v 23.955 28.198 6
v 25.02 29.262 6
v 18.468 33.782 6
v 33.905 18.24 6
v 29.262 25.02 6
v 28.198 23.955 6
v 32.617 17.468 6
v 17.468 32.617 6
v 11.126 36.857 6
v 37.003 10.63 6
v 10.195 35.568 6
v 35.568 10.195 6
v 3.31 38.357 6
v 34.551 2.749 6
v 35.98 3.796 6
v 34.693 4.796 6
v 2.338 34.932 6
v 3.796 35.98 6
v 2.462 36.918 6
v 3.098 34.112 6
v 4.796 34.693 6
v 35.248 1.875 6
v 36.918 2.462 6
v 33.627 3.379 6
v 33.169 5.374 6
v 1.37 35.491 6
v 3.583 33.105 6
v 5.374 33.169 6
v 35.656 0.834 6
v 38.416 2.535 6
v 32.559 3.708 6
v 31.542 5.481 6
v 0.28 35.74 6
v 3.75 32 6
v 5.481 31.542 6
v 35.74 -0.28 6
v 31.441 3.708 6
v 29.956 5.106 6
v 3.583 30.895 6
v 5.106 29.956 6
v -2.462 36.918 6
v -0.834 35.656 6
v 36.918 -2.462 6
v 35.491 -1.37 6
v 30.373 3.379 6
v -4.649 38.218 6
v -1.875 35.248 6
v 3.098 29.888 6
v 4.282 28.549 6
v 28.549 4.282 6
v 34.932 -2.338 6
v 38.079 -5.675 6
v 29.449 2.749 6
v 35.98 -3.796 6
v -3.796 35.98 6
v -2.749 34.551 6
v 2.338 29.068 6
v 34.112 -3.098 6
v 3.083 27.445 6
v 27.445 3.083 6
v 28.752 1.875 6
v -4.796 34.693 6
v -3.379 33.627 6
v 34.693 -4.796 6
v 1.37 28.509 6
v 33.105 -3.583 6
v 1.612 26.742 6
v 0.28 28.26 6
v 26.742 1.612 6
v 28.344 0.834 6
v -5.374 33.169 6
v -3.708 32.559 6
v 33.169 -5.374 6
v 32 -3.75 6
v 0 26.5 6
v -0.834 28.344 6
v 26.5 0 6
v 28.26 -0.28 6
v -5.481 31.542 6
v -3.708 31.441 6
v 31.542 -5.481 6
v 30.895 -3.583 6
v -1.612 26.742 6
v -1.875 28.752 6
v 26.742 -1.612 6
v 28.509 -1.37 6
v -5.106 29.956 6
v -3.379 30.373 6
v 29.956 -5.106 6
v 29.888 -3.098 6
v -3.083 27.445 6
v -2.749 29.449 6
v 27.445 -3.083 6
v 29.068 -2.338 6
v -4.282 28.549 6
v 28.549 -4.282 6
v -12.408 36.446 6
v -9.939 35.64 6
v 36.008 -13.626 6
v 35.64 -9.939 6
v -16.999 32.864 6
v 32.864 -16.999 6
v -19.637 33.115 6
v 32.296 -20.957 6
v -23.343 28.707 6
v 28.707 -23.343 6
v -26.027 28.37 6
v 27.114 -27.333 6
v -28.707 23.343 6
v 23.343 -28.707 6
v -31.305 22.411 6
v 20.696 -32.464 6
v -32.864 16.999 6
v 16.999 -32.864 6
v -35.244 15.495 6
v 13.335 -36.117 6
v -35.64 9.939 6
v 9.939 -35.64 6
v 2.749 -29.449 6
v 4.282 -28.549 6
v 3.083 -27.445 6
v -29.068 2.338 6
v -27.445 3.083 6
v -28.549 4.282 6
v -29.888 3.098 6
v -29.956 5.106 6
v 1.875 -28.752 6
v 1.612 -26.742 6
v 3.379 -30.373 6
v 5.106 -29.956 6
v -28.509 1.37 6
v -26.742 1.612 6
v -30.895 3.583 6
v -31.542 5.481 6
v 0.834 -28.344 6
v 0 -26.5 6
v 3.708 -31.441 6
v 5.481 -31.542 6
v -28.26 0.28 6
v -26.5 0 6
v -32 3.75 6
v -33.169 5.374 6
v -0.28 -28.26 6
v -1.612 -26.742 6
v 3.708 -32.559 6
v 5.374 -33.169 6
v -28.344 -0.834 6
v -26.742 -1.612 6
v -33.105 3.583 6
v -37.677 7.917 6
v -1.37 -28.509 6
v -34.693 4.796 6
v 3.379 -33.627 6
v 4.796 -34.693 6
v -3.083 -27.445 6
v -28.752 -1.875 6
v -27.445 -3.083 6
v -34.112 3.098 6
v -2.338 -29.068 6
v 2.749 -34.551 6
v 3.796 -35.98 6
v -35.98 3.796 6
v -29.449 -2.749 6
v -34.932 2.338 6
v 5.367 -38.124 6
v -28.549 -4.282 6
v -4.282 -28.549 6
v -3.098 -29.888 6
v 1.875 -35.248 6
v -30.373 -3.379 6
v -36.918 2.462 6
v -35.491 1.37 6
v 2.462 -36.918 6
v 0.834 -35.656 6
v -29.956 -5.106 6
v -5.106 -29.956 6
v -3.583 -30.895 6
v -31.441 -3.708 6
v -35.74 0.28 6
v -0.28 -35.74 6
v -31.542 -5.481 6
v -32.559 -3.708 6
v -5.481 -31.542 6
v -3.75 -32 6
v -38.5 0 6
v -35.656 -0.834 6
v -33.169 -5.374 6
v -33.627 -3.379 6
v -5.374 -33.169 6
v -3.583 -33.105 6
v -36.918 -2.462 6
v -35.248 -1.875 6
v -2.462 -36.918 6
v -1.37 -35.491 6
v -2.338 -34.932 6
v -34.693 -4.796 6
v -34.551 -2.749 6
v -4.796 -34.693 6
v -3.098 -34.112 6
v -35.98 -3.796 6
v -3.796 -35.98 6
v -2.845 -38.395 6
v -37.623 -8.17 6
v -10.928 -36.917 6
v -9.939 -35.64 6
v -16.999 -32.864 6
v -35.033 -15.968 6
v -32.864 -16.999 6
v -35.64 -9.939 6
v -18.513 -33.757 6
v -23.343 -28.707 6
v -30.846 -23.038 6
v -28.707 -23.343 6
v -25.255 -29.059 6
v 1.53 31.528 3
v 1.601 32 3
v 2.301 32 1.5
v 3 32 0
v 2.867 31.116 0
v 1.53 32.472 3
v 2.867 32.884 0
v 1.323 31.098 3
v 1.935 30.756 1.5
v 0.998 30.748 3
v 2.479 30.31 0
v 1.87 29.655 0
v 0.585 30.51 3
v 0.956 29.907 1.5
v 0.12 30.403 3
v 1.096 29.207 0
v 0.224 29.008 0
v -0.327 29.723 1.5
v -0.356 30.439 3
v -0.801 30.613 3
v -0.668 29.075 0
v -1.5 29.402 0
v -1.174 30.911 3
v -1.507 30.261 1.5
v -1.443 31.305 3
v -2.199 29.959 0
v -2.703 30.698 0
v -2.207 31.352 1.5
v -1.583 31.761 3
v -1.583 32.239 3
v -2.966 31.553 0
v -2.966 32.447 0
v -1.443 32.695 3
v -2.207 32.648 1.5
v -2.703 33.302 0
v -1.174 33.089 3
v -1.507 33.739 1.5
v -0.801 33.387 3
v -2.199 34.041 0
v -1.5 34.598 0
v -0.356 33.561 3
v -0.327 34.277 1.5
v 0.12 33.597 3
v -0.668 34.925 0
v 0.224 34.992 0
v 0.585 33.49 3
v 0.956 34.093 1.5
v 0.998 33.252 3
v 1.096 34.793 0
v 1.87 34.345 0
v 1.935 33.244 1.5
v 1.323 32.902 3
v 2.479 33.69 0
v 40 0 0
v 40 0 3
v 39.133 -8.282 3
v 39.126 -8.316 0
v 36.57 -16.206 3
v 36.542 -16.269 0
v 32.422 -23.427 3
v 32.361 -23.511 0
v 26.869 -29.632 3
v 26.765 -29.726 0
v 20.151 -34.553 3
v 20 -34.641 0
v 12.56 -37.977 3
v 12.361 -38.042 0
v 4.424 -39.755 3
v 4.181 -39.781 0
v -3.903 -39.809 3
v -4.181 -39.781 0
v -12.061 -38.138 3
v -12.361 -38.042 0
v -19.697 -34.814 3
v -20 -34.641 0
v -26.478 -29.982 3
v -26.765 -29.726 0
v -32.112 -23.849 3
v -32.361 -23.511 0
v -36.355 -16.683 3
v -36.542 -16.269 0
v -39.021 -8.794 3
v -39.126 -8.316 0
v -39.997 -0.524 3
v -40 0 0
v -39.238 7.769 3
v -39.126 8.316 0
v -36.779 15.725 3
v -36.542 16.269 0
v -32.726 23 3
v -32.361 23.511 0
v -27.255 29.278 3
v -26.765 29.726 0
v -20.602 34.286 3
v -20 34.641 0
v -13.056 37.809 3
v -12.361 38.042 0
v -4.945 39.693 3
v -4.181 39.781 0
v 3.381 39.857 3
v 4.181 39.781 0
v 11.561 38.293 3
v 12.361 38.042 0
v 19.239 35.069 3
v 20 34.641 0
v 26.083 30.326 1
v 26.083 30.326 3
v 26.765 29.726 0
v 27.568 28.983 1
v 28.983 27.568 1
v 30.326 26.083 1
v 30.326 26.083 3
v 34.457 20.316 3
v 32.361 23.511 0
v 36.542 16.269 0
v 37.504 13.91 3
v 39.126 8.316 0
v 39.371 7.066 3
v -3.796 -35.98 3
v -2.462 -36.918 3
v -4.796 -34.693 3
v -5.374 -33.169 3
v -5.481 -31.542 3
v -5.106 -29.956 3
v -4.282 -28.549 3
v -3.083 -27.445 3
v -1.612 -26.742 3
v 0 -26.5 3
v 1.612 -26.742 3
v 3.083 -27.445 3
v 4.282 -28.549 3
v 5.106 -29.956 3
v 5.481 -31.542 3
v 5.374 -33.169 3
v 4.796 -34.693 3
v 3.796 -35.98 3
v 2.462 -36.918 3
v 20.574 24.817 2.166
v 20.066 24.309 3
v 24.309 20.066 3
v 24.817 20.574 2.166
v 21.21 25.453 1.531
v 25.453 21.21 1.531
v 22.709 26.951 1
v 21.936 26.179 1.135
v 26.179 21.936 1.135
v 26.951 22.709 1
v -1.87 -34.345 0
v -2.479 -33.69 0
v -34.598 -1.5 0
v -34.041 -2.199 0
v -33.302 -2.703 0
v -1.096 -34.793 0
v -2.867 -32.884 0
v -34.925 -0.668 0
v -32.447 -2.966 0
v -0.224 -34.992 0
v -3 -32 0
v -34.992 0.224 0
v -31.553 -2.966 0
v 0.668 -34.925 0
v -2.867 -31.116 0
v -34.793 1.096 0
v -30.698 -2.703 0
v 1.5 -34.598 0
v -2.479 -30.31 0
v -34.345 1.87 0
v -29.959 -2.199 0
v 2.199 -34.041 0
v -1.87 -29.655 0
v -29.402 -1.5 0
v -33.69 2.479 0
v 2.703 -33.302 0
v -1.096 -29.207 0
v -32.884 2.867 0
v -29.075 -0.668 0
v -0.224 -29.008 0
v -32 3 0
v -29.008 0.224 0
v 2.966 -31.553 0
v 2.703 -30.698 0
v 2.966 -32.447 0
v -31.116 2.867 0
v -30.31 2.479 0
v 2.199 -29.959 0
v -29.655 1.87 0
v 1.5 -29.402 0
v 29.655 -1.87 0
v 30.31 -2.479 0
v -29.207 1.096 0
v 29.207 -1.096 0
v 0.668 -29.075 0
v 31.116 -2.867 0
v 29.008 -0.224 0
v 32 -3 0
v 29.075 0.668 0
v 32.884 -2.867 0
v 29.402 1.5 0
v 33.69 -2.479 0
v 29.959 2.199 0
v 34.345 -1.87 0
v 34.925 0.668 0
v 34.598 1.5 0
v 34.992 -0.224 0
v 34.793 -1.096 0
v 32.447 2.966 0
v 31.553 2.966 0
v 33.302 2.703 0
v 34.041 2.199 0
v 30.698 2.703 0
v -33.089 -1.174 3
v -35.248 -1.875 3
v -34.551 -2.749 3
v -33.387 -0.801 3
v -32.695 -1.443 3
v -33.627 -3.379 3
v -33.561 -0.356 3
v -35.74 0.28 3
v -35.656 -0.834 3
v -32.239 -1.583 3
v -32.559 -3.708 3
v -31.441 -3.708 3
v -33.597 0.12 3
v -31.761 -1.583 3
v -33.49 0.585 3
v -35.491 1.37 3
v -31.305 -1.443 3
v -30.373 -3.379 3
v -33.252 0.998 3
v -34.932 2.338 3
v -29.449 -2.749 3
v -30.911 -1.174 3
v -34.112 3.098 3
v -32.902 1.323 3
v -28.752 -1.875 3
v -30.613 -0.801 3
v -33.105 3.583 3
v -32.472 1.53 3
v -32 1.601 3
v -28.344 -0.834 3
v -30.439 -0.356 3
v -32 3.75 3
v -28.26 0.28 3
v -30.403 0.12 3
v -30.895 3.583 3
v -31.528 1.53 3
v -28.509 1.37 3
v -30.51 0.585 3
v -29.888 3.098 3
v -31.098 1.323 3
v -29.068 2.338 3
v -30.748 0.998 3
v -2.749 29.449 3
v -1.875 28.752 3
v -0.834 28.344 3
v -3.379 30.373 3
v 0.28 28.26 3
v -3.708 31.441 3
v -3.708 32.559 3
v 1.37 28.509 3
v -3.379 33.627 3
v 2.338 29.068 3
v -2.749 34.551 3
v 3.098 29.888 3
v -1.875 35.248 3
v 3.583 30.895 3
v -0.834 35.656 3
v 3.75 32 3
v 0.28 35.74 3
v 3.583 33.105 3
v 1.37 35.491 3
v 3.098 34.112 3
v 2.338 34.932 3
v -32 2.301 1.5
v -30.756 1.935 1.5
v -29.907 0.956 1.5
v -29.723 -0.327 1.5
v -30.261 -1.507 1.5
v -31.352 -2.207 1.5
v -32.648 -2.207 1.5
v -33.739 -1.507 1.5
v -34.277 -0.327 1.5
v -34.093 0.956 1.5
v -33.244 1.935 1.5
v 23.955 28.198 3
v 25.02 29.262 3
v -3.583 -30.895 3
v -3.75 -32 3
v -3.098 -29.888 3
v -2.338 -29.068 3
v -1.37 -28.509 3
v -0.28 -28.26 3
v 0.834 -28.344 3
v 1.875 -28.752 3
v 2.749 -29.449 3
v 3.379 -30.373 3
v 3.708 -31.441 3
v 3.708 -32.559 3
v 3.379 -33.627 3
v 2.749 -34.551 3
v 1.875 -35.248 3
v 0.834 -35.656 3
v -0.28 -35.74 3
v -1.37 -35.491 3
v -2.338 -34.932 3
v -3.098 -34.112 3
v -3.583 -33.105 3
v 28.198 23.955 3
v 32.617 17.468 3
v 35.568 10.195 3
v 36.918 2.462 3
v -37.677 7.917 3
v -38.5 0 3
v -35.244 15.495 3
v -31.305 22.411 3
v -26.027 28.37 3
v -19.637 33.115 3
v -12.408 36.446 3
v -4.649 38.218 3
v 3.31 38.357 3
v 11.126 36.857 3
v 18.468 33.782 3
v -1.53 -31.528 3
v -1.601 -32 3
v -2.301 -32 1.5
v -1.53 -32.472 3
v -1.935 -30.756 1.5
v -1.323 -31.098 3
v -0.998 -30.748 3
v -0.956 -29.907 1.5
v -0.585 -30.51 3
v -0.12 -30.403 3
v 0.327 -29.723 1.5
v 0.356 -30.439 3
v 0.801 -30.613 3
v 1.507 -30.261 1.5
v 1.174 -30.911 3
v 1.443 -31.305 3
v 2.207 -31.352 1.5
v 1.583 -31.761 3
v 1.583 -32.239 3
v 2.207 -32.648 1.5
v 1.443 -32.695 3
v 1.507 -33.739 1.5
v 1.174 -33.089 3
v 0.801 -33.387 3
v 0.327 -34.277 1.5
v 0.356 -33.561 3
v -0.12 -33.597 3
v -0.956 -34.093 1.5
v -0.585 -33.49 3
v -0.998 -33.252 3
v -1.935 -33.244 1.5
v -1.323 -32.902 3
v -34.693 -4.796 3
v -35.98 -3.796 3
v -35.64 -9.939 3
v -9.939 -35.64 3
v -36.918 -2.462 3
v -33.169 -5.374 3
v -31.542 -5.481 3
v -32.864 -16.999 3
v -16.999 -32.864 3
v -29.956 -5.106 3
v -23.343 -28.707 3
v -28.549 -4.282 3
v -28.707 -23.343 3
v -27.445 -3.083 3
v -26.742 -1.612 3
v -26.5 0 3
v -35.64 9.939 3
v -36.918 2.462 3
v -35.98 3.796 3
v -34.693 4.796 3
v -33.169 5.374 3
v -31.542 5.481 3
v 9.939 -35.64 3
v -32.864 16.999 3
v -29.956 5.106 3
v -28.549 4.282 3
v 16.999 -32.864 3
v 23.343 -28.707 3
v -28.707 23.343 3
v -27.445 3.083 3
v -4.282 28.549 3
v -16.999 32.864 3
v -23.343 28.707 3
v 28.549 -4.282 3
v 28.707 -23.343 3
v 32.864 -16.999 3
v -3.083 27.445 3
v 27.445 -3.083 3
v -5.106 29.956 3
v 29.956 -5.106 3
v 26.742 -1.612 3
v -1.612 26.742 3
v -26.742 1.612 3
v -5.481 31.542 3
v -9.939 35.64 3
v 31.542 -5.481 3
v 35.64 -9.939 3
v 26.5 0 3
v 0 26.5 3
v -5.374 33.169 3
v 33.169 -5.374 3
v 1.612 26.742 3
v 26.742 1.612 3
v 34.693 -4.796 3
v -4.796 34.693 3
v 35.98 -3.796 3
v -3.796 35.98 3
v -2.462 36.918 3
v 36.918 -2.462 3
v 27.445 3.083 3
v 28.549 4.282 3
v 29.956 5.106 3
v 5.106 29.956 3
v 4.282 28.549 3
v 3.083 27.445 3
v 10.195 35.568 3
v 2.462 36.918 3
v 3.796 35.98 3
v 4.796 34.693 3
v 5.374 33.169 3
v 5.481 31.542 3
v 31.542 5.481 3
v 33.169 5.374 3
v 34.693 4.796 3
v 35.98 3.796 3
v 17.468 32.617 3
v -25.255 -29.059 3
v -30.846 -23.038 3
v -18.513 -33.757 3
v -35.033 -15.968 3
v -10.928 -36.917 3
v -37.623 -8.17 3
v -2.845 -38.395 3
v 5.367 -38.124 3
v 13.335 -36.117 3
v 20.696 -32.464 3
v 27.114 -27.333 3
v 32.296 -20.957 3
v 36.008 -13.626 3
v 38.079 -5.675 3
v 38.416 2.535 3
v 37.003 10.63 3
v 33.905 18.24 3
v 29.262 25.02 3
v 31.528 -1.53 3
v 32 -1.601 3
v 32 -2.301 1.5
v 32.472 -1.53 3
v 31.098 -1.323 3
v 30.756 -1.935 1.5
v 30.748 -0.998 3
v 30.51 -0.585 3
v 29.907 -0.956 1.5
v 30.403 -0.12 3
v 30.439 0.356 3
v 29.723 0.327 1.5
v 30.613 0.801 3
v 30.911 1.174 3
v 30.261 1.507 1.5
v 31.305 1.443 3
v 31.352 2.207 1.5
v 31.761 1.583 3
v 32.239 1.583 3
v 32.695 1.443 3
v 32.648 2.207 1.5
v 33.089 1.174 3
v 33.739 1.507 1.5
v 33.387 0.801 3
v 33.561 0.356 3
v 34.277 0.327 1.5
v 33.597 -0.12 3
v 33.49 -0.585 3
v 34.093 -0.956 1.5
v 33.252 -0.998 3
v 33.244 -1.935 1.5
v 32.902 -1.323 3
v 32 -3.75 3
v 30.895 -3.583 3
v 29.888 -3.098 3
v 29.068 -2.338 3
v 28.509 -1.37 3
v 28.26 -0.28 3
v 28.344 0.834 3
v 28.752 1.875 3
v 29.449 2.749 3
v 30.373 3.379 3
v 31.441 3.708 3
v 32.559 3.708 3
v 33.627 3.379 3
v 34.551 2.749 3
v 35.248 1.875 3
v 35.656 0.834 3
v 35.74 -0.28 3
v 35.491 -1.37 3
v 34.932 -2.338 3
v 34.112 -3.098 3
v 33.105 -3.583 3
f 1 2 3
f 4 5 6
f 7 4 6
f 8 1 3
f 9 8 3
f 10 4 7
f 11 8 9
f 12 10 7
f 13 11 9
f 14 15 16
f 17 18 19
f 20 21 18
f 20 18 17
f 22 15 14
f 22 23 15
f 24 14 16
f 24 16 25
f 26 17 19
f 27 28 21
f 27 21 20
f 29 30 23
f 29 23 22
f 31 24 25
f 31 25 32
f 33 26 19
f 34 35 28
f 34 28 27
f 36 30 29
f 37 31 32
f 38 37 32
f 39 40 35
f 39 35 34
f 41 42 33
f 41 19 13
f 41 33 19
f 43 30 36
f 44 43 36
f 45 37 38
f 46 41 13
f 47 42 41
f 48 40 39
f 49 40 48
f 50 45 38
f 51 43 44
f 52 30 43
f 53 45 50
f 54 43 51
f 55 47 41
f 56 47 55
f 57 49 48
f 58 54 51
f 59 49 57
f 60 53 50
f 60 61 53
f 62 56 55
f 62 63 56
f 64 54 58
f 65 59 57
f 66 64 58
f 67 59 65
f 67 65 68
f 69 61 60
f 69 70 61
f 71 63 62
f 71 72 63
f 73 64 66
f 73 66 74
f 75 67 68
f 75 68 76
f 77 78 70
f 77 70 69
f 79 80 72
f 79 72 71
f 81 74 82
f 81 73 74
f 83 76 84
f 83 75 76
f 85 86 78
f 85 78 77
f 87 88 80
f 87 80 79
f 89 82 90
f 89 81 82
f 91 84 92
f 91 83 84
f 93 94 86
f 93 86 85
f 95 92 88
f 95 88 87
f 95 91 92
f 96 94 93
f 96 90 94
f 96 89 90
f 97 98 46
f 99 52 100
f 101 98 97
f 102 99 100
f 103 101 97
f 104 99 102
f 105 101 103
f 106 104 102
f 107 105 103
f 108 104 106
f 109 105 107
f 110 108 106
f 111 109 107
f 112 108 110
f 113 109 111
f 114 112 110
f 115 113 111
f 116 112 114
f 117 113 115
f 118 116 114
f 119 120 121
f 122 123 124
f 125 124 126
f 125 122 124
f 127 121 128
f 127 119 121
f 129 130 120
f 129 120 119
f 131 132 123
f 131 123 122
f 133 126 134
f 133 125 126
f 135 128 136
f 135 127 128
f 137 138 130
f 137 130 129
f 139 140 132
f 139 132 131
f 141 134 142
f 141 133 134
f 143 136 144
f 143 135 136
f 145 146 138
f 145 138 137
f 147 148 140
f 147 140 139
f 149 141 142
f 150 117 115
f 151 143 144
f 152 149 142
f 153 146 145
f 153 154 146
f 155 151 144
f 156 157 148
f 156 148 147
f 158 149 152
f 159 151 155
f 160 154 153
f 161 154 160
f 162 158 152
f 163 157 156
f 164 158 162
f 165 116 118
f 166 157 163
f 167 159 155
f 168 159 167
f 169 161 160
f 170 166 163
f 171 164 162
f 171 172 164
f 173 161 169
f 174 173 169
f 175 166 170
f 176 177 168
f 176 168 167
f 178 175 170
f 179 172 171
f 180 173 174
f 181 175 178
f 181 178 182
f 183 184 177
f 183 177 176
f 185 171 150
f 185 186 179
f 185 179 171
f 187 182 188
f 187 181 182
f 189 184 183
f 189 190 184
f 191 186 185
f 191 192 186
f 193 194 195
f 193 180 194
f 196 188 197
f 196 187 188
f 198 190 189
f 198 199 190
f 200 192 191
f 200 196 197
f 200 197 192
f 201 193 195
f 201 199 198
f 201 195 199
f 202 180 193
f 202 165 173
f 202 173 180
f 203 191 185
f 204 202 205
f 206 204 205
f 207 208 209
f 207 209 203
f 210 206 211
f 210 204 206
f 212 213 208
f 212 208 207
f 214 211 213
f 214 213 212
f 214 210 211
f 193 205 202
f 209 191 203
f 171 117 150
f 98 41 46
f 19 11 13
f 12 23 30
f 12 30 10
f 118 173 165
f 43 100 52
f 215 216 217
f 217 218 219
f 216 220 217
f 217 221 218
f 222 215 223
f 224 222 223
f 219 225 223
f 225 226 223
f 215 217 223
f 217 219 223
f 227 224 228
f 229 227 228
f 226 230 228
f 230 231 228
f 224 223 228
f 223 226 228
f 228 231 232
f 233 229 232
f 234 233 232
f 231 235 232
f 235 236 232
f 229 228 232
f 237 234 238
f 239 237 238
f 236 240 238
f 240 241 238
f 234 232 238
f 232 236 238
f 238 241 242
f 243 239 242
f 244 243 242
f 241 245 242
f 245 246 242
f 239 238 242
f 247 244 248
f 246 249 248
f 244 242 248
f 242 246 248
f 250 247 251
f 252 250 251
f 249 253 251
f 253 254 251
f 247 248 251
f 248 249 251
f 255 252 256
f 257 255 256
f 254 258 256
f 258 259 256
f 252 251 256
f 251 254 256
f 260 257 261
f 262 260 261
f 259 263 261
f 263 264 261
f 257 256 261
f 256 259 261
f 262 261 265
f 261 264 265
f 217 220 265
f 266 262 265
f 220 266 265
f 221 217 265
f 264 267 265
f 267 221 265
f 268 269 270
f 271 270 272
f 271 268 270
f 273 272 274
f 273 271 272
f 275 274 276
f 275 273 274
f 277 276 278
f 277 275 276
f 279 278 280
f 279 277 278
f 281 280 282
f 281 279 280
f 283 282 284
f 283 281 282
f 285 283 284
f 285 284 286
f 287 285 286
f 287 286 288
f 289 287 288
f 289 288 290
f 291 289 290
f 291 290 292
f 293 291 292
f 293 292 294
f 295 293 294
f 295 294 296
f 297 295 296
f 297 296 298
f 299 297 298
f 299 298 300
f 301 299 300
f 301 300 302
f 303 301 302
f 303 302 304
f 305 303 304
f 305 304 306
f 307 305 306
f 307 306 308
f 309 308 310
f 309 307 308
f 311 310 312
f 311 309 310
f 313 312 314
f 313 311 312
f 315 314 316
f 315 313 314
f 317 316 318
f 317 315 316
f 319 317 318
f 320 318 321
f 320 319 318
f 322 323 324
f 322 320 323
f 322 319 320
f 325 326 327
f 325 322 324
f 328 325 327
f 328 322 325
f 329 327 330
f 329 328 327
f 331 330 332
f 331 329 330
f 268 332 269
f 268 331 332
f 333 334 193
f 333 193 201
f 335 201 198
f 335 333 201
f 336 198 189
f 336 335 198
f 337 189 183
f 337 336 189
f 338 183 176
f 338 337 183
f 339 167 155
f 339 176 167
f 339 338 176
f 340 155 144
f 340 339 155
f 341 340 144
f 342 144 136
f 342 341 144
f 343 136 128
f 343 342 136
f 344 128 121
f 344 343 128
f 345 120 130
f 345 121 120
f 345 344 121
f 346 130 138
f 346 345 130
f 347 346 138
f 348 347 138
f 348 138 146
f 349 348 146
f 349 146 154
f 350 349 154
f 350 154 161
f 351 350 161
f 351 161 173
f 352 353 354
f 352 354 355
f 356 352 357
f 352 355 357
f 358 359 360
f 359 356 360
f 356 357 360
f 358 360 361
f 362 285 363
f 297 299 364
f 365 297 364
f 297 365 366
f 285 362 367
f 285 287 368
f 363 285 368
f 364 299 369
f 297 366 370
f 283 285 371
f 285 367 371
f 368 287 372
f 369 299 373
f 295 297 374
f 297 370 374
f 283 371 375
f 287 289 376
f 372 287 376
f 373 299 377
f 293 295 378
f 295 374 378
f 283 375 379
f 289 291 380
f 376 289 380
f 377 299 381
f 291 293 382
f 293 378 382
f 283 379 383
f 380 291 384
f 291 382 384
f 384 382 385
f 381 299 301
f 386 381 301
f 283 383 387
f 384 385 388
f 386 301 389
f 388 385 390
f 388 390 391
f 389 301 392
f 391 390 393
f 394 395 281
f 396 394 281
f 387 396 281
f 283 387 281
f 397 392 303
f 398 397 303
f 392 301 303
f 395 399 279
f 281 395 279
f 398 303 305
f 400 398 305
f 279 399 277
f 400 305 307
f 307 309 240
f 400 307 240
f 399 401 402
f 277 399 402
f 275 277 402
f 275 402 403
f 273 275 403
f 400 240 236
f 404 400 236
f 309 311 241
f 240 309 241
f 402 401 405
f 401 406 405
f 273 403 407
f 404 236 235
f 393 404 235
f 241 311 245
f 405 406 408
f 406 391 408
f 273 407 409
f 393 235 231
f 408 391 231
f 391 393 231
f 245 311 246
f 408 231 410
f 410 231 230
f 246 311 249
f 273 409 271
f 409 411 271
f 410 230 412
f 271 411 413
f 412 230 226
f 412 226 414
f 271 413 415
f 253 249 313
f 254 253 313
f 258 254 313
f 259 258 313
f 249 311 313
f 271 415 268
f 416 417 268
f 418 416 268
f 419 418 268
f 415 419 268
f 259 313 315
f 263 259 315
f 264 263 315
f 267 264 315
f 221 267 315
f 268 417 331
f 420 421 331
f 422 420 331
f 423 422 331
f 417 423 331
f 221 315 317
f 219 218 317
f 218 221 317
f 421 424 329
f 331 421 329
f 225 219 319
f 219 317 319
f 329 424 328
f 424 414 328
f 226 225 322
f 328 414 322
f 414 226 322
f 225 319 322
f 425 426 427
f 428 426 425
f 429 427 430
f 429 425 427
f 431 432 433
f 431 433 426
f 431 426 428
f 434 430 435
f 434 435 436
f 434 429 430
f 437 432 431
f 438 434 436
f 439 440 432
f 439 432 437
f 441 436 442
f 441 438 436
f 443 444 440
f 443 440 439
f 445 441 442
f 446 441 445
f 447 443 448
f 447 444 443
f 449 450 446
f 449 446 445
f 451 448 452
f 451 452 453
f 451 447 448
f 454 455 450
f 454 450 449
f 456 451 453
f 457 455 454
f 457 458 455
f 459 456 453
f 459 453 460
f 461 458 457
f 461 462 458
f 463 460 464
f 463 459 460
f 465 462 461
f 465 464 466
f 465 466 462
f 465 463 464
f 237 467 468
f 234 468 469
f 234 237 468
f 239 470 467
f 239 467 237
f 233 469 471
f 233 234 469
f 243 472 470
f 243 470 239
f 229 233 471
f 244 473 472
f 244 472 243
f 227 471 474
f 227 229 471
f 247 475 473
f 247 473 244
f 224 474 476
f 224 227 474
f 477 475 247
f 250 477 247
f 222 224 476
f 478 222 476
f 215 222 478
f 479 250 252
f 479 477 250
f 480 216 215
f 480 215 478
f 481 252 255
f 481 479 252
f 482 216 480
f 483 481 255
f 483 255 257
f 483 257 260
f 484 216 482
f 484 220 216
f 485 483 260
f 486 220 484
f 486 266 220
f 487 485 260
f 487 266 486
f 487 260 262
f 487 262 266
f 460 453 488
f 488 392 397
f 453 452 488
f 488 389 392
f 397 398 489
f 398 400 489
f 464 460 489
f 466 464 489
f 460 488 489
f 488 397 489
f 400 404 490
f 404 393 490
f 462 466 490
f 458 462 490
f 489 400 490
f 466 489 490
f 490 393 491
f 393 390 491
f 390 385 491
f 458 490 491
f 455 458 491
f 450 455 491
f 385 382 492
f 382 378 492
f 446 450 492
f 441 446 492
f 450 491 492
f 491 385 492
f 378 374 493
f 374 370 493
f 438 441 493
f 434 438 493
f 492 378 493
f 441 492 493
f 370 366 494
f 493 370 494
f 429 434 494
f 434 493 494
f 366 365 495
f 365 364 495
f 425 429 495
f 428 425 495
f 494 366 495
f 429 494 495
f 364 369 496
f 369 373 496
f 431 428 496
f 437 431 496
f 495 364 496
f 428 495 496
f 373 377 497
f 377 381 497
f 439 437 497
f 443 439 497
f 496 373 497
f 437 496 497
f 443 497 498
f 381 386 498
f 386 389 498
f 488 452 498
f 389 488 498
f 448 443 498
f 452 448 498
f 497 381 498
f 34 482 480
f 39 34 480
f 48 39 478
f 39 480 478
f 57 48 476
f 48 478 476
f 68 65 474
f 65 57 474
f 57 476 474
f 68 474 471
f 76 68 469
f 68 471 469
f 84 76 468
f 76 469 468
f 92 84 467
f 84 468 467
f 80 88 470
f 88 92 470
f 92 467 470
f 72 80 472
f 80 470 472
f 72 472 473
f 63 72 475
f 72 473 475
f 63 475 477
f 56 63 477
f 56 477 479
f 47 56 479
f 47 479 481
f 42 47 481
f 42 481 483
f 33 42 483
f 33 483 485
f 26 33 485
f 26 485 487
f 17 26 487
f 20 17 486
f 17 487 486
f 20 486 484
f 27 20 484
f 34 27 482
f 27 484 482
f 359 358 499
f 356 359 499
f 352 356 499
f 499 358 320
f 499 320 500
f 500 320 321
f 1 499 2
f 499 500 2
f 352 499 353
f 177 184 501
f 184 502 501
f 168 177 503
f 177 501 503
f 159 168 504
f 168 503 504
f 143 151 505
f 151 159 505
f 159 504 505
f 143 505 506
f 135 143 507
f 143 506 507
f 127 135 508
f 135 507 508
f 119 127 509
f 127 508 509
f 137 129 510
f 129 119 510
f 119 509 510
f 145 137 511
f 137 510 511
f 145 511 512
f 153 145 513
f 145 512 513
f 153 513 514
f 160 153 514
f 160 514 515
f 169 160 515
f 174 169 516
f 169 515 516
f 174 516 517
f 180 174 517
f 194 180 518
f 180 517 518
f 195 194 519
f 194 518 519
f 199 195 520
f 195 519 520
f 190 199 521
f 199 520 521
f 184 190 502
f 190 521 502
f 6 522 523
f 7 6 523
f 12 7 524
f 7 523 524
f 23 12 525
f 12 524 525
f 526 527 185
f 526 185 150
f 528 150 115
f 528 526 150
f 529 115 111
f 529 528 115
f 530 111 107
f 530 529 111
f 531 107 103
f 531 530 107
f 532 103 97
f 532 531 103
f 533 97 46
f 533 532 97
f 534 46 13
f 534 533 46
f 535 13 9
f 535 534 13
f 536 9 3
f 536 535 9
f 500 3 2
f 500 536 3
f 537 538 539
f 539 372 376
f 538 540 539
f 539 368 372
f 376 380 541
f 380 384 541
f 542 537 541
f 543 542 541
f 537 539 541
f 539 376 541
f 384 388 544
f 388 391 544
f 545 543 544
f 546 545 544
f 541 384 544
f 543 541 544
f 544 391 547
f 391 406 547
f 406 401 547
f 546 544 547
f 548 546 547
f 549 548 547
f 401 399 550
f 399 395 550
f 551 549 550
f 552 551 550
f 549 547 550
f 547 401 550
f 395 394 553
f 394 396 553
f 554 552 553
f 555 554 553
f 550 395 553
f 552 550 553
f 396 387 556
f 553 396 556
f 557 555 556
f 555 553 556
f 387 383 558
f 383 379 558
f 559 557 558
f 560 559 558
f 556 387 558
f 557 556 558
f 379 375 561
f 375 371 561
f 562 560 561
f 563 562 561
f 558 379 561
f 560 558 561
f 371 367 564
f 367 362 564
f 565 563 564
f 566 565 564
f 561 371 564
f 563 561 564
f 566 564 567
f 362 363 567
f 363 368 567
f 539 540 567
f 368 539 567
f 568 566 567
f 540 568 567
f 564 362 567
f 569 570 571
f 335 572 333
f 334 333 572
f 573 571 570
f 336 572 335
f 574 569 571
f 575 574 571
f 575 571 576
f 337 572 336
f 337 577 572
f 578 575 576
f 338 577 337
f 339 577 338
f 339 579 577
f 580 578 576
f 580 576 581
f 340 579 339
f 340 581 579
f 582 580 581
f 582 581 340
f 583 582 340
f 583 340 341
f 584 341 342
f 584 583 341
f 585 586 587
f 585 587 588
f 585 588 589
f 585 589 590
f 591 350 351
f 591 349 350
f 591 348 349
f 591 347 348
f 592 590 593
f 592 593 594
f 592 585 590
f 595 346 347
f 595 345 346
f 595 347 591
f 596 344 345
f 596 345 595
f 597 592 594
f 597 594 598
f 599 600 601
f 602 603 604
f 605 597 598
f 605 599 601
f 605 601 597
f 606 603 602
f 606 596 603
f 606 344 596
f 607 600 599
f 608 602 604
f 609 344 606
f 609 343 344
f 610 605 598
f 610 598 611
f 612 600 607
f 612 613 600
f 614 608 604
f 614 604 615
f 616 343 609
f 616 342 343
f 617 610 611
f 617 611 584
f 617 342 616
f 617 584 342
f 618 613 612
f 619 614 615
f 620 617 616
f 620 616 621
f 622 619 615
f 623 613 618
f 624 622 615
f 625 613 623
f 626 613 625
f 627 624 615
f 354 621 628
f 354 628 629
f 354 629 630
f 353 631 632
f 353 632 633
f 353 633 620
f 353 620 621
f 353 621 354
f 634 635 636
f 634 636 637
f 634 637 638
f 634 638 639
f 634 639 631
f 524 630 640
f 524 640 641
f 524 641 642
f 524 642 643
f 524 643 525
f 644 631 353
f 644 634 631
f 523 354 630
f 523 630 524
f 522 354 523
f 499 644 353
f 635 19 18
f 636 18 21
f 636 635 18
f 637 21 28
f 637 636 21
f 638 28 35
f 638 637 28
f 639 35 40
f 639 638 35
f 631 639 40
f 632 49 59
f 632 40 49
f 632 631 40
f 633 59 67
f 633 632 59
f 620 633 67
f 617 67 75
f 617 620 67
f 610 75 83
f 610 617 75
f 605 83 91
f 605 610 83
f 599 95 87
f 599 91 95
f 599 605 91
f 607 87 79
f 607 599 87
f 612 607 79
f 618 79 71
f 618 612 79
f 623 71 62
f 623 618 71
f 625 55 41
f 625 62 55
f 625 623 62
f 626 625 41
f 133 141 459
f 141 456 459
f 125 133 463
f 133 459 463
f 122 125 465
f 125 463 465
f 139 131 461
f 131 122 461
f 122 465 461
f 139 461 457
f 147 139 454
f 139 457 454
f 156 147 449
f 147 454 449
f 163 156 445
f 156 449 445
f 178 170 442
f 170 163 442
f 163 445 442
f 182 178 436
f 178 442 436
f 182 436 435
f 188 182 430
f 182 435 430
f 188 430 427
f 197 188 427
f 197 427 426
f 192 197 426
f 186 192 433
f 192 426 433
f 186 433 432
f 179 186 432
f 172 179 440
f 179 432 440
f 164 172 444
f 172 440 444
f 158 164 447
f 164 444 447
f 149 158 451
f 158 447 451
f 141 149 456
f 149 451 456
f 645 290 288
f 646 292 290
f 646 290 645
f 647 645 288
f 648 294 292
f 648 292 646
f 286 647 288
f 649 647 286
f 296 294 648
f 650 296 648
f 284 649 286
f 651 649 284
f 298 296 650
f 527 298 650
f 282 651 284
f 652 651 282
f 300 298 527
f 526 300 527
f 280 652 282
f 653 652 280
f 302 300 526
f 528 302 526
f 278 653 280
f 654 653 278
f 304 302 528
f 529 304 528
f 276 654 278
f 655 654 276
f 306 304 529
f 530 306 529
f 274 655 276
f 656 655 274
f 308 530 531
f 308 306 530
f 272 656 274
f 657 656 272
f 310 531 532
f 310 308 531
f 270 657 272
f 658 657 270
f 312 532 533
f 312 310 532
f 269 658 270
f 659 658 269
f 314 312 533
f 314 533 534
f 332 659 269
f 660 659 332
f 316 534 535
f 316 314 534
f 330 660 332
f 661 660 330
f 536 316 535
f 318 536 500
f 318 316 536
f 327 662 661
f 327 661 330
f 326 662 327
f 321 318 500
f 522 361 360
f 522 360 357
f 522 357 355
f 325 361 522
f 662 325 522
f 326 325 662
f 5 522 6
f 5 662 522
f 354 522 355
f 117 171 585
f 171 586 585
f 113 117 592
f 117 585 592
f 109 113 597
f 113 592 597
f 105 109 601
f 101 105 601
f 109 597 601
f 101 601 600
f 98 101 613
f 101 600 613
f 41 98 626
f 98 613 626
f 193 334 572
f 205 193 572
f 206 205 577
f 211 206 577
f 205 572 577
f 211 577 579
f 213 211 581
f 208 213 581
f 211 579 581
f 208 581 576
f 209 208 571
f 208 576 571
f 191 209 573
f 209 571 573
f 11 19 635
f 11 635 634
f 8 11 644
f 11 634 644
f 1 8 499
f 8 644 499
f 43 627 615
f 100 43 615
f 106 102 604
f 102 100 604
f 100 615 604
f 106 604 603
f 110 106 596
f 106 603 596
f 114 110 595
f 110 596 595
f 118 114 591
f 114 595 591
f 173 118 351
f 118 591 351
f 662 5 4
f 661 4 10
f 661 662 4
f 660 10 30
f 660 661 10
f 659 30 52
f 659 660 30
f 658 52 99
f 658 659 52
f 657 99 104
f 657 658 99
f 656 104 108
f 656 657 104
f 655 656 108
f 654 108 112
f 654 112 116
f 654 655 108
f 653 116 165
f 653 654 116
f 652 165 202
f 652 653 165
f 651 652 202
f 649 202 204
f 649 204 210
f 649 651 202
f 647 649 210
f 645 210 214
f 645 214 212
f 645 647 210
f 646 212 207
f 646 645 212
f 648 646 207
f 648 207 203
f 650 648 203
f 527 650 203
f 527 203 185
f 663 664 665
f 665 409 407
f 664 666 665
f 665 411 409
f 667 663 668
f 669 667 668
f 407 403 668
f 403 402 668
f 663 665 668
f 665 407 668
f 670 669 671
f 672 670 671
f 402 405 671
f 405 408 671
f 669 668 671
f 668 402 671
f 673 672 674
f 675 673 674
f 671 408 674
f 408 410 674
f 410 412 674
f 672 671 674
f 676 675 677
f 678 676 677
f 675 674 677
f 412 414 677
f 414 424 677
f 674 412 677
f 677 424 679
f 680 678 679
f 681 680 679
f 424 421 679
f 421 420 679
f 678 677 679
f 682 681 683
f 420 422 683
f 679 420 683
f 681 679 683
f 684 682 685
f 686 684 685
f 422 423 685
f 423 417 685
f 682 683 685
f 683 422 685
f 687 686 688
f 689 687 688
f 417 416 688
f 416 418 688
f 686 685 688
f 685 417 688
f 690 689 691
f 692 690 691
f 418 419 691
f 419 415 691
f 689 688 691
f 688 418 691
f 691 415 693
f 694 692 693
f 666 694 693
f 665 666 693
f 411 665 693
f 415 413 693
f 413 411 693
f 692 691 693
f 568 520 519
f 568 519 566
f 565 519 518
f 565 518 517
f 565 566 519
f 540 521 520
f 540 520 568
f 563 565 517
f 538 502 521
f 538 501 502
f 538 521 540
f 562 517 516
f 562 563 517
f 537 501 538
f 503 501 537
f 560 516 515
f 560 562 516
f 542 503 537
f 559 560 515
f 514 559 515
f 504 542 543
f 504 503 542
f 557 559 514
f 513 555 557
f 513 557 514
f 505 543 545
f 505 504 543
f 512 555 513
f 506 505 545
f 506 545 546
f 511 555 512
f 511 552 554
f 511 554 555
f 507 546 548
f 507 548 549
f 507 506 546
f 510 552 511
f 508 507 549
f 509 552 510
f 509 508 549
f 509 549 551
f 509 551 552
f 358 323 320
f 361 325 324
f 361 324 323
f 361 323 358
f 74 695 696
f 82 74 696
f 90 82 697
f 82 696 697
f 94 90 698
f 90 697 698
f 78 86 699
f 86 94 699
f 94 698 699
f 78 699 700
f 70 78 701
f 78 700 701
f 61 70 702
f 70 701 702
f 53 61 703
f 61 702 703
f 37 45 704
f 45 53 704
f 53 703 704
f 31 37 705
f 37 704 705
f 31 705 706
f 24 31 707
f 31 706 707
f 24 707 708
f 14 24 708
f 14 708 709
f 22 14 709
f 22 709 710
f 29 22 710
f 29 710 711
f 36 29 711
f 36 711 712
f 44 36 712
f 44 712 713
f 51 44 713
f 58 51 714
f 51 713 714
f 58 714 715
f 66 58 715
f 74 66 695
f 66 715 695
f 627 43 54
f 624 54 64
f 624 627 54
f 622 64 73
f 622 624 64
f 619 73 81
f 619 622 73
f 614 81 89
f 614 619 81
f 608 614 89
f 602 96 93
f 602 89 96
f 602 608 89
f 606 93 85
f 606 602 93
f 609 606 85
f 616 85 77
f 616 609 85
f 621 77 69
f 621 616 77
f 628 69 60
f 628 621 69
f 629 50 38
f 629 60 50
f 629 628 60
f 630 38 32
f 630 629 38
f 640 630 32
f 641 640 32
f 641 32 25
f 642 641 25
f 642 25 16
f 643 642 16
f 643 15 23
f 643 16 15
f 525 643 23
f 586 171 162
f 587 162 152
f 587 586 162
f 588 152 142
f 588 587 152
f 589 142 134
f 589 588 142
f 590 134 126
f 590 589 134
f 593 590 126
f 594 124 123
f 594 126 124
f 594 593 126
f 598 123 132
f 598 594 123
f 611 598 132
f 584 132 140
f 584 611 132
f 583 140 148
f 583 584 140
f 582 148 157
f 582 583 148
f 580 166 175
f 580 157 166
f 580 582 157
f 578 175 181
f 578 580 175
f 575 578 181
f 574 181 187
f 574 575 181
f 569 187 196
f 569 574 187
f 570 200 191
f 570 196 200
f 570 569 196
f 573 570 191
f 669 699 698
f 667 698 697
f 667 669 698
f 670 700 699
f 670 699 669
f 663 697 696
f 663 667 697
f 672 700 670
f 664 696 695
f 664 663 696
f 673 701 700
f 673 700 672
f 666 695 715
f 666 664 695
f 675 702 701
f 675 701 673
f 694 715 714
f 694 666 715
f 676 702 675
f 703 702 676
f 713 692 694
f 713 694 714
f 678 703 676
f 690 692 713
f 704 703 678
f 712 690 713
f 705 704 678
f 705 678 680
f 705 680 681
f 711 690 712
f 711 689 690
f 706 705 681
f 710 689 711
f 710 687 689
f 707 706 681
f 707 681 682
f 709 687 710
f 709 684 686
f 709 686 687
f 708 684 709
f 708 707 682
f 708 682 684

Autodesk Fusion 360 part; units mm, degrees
sketch "Sketch1" plane through (0, 0, 0) normal (0, 0, 1) x (1, 0, 0)
  circle A0 centre (0, 0) radius 40
  dimension "d1" = 80
extrude "Extrude1" add sketch "Sketch1" along normal blind 3
sketch "Sketch2" plane through (0, 0, 3) normal (0, 0, 1) x (-1, 0, 0)
  circle A0 centre (0, 0) radius 40
  circle A1 centre (0, 0) radius 38.5
  circle A2 centre (0, 32) radius 3.75
  circle A3 centre (0, 32) radius 5.5
  circle A4 centre (0, 0) radius 37
  dimension "d4" = 77
  dimension "d5" = 7.5
  dimension "d6" = 11
  dimension "d7" = 32
  dimension "d8" = 74
extrude "Extrude2" add sketch "Sketch2" along normal blind 3 contours A1 | A3 A4 | A3 A4 picked at (-1.5513, 36.4665) picked at (0.1215, 37.1566)
pattern_circular "C-Pattern1" count 4 over 360 about axis through (0, 0, 1.75) along (0, 0, 1) of "Extrude2"
sketch "Sketch3" plane through (0, 0, 0) normal (0, 0, -1) x (1, 0, 0)
  circle A0 centre (0, 0) radius 40
  circle A1 centre (0, -32) radius 3
  dimension "d13" = 6
  dimension "d14" = 32
extrude "Extrude3" cut sketch "Sketch3" against normal through all draft -25 contours A1
pattern_circular "C-Pattern2" count 4 over 360 about axis through (0, 0, 0) along (0, 0, 1) of "Extrude3"
ref_plane "WorkPlane1" through (0, 0, 0) normal (-0.707107, 0.707107, 0) x (0, 0, 1)
sketch "Sketch4" plane through (0, 0, 0) normal (-0.707107, 0.707107, 0) x (0, 0, 1)
  line L0 (6, -27.2236) -> (6, 38.5)
  line L1 (6, -38.5) -> (6, -27.2236)
  line L2 (3, -40) -> (3, -38.5)
  line L3 (3, 38.5) -> (3, 40)
  line L4 (0, -40) -> (0, 40)
  line L5 (3, -38.5) -> (6, -38.5)
  line L6 (3, 38.5) -> (6, 38.5)
  line L7 (0, -40) -> (3, -40)
  line L8 (0, 40) -> (3, 40)
  line L9 (3, 40) -> (6, 40)
  line L10 (6, 40) -> (6, 30.653)
  line L11 (3, 40) -> (1, 40)
  line L12 (1, 40) -> (1, 35.115)
  arc A0 (1, 35.115) -> (6, 30.653) centre (5.4909, 35.115) ccw
  dimension "d18" = 3
  dimension "d19" = 9.347
  dimension "d20" = 2
  dimension "d21" = 4.885
extrude "Extrude4" cut sketch "Sketch4" along normal mid plane 6 contours L0 L3 L6 L8 L10 L11 L12 A0 | L3 L6 L9 L10
